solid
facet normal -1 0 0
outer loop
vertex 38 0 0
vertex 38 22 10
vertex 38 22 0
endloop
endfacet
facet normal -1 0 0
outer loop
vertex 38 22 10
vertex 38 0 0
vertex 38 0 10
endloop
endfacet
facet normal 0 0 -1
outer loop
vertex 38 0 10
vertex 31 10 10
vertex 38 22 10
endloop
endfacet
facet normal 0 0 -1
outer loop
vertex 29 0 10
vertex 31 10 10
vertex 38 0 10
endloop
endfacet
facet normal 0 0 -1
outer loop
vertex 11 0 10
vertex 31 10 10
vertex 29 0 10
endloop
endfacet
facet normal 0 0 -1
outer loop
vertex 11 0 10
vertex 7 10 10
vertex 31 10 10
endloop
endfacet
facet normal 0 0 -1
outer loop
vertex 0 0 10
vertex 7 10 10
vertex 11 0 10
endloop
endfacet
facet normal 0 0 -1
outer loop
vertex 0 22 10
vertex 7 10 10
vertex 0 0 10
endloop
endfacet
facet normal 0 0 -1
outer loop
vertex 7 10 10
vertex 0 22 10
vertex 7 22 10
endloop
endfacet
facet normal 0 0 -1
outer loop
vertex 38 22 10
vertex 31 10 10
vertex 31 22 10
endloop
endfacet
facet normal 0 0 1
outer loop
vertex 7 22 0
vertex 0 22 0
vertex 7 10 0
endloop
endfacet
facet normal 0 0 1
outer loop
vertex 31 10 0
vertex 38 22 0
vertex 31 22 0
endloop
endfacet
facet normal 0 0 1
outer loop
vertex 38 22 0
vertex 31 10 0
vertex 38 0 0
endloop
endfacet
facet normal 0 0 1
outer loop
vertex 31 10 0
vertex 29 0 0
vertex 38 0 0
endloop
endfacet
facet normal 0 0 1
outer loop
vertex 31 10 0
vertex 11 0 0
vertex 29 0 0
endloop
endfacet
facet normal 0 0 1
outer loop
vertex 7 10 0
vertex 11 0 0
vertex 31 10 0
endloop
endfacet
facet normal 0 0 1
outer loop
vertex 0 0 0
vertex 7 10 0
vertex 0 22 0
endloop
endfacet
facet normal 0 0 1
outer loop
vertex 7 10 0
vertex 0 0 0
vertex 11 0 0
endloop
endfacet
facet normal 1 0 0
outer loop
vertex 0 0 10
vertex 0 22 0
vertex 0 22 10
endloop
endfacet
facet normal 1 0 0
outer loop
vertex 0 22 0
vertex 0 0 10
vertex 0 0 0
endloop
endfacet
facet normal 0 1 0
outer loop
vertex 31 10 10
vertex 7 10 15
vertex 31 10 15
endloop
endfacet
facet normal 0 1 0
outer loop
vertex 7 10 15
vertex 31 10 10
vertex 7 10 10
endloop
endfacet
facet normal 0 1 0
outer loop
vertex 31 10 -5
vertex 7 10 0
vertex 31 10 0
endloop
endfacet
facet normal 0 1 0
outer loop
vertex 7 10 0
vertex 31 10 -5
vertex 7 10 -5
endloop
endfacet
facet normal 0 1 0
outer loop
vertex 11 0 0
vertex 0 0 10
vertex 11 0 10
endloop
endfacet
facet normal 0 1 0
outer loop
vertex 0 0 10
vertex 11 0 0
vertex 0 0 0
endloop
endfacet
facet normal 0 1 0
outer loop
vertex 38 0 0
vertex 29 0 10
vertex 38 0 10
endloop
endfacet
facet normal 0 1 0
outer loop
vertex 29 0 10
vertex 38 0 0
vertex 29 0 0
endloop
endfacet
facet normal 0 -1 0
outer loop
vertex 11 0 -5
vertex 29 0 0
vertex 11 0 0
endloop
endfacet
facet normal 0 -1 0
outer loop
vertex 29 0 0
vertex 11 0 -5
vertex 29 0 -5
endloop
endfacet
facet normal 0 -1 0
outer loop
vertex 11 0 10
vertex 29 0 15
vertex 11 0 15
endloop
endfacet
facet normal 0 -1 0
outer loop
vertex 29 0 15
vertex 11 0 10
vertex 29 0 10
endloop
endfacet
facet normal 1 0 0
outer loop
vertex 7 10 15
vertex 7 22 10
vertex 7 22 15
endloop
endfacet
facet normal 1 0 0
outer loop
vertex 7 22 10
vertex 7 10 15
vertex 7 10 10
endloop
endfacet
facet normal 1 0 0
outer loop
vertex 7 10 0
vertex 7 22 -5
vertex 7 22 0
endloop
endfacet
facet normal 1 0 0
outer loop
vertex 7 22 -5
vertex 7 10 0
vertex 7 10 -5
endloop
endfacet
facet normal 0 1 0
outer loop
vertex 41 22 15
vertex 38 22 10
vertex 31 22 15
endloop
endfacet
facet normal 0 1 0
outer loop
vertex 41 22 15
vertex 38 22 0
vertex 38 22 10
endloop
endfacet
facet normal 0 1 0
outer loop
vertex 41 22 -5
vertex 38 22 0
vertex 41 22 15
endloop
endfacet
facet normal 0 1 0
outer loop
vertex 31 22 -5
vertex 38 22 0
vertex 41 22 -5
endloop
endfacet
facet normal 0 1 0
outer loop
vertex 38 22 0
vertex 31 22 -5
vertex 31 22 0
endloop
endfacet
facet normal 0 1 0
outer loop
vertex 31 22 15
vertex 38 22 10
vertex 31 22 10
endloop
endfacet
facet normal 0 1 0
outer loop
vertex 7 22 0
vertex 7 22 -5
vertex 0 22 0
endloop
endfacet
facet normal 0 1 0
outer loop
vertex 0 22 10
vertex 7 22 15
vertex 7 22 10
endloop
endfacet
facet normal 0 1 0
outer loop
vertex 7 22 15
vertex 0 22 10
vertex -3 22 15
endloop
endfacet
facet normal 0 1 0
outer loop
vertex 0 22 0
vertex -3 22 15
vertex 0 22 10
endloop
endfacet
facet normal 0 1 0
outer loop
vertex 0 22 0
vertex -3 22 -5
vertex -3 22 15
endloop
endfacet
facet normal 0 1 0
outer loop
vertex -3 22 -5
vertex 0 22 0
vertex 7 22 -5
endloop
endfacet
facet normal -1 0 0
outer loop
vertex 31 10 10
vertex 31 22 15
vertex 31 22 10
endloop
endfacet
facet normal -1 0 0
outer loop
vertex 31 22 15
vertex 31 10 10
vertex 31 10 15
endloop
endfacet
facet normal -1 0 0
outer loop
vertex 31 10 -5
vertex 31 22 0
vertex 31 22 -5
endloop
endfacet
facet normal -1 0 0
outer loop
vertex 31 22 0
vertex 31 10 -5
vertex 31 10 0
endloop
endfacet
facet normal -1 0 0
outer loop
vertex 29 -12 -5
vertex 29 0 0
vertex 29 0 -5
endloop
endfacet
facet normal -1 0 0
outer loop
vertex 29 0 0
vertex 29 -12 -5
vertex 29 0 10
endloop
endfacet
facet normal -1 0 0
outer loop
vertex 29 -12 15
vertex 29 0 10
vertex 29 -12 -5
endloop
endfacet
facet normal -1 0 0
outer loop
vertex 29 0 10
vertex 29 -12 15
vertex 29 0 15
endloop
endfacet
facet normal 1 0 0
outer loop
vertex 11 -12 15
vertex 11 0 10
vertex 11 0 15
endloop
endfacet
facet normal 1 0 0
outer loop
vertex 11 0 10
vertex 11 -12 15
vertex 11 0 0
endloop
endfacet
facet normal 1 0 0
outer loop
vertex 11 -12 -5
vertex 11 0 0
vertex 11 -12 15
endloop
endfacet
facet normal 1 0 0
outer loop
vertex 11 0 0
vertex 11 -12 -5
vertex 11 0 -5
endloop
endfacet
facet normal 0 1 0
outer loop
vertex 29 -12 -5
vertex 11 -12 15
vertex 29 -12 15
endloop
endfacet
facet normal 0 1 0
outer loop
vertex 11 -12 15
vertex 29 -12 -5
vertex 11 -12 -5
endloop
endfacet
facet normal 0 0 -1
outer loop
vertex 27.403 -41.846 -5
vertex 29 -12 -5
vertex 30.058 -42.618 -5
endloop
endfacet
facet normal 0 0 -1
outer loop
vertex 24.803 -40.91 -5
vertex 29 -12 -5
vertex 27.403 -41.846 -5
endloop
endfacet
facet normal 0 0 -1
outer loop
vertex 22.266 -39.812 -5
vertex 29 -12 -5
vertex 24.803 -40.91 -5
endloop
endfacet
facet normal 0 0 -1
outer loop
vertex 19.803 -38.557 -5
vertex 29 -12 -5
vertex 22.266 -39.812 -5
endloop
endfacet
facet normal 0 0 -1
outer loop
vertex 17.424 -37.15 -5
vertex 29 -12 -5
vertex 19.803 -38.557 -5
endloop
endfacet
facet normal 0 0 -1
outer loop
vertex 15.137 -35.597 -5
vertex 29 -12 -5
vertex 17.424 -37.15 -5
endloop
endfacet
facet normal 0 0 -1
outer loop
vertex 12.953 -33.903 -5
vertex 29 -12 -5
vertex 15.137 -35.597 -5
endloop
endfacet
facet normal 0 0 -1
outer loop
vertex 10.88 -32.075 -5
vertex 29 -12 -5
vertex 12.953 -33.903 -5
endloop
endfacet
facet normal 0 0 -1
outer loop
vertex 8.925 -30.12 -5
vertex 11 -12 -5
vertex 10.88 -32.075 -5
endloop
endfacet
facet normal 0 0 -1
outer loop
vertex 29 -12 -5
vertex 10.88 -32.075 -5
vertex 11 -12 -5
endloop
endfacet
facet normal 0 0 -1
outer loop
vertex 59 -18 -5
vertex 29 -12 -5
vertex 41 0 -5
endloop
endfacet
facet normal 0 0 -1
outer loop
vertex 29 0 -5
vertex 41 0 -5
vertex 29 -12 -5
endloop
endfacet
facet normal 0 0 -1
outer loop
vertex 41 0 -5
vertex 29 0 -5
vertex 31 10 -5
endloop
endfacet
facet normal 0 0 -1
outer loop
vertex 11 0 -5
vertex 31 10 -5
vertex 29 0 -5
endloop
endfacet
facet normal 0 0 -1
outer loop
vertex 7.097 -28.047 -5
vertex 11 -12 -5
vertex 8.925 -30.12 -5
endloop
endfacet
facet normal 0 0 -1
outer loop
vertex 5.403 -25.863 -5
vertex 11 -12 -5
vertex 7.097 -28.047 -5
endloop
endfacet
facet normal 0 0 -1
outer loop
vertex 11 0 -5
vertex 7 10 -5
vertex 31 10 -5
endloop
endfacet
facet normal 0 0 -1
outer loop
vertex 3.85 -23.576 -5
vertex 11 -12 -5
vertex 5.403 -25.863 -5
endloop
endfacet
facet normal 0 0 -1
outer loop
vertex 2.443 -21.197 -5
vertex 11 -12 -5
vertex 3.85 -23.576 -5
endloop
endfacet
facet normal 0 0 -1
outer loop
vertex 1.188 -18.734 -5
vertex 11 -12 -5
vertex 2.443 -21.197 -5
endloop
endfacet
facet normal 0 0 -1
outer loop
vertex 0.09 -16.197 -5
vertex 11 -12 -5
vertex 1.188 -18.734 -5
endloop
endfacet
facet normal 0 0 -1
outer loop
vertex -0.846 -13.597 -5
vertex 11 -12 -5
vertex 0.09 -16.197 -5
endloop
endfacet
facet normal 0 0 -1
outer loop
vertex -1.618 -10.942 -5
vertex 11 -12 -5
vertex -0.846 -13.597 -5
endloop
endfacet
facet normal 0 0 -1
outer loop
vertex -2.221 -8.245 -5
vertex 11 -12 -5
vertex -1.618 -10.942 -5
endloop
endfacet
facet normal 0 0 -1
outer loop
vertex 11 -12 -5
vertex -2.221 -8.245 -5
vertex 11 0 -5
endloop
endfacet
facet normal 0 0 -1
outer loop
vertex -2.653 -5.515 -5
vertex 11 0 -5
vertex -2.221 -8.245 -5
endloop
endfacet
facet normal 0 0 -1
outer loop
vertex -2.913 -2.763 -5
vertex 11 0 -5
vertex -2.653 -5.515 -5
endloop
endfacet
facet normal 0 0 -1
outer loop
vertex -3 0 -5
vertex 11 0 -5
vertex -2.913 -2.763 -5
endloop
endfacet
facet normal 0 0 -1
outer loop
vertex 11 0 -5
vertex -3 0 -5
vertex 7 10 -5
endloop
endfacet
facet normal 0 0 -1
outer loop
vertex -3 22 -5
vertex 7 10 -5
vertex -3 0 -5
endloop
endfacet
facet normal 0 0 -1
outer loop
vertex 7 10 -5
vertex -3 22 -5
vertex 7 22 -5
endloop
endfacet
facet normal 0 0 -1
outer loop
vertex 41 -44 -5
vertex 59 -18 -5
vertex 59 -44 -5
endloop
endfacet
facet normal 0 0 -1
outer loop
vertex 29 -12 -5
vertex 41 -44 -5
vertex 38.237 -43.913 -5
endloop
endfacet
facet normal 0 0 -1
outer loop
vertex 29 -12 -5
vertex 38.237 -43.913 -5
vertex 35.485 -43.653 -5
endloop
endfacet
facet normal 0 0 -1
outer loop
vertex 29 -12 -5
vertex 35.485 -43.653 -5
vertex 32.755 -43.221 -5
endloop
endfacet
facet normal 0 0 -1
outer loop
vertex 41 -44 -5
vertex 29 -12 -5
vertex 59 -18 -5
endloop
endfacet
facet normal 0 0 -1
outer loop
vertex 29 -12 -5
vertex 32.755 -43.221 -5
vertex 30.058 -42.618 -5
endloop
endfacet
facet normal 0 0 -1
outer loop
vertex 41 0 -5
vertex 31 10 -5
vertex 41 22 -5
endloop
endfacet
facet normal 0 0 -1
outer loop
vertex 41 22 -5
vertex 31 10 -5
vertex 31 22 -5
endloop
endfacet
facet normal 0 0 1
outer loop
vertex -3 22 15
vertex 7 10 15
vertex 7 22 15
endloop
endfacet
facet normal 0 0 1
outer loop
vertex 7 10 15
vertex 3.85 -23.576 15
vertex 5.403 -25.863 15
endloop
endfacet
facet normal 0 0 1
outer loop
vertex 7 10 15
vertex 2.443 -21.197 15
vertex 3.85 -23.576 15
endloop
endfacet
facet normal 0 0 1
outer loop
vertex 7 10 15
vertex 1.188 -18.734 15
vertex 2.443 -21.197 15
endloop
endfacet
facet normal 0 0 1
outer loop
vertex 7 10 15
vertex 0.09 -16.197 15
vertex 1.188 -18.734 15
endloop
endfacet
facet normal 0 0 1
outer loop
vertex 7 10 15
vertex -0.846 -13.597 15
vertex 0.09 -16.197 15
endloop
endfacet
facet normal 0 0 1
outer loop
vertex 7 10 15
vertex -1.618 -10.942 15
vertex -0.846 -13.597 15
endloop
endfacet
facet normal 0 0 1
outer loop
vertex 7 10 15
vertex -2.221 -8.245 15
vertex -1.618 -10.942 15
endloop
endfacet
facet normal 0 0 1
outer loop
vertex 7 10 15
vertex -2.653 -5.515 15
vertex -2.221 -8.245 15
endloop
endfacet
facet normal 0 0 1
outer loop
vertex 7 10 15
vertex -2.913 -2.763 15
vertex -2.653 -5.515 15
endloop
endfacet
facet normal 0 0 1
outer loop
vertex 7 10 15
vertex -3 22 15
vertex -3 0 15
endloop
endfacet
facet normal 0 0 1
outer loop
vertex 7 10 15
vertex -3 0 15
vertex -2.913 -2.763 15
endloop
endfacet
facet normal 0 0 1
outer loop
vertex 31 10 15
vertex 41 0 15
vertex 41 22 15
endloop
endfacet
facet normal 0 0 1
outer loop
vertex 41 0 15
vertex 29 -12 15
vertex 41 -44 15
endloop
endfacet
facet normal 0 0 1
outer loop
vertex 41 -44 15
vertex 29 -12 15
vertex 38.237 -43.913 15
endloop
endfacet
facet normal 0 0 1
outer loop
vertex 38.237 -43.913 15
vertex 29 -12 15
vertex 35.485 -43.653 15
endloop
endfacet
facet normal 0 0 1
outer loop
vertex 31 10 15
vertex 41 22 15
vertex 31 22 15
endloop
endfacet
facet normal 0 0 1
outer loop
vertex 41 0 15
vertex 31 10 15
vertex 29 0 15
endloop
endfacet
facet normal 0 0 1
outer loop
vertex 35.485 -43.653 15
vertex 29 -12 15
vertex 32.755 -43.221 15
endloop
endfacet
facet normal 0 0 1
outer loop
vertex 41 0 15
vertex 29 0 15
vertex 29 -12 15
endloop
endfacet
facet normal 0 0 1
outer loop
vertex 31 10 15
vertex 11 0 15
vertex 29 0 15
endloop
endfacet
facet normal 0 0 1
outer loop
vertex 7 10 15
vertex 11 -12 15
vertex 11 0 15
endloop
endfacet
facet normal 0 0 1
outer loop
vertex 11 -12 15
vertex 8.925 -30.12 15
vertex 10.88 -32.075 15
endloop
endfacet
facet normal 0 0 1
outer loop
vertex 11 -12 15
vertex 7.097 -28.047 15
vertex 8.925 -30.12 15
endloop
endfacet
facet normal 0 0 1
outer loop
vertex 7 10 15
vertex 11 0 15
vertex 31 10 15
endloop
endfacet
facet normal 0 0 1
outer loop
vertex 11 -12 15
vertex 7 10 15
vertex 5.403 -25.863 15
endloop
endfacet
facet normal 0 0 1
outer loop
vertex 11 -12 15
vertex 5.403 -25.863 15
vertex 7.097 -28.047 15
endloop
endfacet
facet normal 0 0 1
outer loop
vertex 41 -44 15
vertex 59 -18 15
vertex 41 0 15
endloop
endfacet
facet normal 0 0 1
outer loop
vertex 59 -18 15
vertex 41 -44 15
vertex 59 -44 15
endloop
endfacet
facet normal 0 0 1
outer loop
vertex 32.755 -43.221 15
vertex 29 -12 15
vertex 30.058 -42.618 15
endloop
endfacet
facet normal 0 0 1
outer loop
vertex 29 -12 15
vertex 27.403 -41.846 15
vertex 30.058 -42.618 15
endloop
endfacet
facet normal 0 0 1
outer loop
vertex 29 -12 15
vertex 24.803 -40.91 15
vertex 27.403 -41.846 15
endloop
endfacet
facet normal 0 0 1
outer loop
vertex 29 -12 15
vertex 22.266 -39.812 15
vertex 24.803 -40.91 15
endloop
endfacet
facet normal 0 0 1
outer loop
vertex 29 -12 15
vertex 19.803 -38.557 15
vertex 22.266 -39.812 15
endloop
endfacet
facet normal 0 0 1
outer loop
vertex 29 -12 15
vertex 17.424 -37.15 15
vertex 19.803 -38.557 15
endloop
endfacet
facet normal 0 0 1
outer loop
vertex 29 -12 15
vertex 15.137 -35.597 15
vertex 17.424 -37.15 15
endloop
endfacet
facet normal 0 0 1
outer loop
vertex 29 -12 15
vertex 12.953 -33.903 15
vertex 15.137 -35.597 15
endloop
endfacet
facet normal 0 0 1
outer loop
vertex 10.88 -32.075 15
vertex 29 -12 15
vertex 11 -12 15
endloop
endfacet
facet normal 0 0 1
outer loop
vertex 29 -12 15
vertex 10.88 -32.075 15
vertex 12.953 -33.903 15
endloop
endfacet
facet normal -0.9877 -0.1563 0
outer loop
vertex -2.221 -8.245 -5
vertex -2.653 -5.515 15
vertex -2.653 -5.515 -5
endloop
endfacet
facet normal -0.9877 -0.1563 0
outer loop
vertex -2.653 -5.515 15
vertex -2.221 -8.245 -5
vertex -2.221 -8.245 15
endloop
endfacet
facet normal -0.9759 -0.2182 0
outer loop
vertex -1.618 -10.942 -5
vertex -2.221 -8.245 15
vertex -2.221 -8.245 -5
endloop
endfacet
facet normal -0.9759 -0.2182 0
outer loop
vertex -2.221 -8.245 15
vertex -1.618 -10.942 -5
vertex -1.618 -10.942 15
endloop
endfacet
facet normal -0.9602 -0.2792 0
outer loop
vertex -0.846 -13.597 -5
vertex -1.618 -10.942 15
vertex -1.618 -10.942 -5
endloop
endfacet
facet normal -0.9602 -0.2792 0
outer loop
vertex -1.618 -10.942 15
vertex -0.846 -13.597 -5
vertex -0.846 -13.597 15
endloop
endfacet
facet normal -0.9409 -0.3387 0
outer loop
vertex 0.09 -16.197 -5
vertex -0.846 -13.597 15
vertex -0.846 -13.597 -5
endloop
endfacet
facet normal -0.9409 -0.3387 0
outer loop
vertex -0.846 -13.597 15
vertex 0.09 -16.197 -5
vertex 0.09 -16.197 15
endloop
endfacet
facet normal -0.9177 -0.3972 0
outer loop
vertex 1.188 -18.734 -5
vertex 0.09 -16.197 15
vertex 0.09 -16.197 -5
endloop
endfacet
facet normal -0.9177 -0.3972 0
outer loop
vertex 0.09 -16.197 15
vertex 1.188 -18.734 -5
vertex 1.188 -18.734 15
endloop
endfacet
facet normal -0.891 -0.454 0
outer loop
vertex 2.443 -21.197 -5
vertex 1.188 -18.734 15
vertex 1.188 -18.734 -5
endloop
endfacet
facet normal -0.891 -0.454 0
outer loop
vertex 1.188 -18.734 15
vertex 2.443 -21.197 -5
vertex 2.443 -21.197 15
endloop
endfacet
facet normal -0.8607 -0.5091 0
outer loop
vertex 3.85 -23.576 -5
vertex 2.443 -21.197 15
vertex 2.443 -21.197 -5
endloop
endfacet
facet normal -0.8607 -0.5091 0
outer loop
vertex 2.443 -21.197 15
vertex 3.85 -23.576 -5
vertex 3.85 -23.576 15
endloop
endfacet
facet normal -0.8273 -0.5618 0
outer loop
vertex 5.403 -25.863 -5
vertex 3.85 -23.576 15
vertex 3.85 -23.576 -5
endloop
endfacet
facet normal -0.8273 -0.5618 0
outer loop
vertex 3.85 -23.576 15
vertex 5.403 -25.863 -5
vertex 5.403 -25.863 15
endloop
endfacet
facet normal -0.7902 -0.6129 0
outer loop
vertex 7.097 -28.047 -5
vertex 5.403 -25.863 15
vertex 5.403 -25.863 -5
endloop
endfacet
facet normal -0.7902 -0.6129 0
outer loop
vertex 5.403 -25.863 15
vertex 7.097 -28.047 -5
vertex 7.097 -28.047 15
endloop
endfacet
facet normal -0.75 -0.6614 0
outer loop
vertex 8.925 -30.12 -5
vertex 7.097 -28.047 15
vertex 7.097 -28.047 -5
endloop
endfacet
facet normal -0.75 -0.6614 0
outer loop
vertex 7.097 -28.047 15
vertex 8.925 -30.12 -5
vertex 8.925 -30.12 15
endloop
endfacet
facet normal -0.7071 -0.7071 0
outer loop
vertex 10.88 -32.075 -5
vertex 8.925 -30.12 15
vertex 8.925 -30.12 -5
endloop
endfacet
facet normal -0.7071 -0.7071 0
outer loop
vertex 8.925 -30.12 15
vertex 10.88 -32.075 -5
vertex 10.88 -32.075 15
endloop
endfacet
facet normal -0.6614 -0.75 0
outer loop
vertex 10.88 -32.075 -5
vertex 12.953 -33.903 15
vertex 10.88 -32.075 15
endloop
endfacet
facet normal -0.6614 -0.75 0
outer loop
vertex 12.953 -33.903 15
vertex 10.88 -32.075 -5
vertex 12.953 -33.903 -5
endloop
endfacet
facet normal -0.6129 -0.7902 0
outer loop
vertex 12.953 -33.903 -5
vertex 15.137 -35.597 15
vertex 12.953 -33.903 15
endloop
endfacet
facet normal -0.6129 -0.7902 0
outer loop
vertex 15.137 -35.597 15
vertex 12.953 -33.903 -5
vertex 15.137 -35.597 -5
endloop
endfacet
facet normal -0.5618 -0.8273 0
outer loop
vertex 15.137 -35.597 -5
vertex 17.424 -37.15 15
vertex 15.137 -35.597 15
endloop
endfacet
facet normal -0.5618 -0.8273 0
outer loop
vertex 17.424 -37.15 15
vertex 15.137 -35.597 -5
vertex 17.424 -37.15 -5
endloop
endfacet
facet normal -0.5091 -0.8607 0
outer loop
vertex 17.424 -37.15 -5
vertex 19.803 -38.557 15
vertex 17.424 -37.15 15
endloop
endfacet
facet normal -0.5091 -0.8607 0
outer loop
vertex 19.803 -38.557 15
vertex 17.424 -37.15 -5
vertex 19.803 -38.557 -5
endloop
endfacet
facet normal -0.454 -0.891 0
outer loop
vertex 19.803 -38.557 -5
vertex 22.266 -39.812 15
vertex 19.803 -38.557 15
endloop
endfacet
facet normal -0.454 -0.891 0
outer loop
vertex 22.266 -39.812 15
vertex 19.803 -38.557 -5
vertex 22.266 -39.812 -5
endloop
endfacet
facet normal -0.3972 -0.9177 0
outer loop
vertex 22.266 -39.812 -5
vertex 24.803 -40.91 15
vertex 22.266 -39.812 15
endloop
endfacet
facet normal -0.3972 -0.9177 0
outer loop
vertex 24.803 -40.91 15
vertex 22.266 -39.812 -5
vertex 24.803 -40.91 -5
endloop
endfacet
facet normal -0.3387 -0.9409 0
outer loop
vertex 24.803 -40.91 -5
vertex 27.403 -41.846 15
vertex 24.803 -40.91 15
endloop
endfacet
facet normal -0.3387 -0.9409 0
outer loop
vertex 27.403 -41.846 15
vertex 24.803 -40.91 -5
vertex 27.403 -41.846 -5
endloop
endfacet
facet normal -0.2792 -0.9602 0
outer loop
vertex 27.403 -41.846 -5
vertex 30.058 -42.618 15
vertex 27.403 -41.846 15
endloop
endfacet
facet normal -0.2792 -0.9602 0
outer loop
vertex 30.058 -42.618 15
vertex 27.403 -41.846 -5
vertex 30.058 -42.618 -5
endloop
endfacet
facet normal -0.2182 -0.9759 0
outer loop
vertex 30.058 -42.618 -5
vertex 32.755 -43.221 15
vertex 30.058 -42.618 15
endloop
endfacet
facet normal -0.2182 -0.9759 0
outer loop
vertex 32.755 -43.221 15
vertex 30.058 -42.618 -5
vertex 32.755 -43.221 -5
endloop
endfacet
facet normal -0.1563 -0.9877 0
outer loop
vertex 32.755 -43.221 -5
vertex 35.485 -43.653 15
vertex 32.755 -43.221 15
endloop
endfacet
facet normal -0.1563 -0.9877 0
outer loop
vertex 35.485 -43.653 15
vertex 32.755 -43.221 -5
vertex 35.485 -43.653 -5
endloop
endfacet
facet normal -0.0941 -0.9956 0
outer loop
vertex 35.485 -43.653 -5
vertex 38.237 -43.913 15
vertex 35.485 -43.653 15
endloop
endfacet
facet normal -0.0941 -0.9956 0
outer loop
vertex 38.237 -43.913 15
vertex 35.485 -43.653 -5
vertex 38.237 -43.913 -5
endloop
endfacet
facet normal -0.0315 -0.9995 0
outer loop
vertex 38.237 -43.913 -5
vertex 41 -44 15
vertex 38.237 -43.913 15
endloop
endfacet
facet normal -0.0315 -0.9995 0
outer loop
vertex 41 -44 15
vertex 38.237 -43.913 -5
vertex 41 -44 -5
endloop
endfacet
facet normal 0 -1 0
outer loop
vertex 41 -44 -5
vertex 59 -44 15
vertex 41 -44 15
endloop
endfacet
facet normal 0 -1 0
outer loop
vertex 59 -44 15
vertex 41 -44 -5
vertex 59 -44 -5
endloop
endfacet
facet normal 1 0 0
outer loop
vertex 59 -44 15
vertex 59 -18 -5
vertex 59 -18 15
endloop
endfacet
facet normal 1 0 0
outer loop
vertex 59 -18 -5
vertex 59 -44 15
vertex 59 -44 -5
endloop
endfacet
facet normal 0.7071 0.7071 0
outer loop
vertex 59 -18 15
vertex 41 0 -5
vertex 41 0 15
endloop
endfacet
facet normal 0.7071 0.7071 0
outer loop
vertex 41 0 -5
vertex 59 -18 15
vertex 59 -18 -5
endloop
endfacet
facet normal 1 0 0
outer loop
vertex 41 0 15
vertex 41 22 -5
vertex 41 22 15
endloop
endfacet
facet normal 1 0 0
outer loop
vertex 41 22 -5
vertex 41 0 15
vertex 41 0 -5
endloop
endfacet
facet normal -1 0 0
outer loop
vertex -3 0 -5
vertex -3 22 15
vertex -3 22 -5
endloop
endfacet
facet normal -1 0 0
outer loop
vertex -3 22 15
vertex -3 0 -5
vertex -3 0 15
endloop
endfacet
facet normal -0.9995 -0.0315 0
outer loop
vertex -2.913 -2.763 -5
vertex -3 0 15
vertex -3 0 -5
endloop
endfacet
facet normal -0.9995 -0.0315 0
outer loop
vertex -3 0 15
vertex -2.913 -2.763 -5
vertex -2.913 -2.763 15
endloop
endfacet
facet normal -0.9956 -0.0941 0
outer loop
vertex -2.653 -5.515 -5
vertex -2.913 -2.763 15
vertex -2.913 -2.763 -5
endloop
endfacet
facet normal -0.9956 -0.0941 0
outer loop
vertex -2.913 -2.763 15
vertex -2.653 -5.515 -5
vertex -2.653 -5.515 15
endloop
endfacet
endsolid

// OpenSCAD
$fn=100;
i=44;
module empileur() {
	cube([38,10,10]);
	cube([7,22,10]);
	translate([31,0,0]) cube([7,22,10]);
	translate([11,-12,-50]) #cube([18,12,100]);
	translate([7,10,-25]) #cube([24,12,50]);
}
module plaque() {
	intersection() {
		translate([i,0])circle(i);
		translate([0,-i])square([i,i]);
	}
	translate([i,-i])difference() {
		square([18,i]);
		translate([0,i])rotate([0,0,-45])
			square([27,15]);
	}
square([44,22]);
}



difference() {
translate([-3,0,-5])linear_extrude(height = 20)plaque();
#empileur();
}
